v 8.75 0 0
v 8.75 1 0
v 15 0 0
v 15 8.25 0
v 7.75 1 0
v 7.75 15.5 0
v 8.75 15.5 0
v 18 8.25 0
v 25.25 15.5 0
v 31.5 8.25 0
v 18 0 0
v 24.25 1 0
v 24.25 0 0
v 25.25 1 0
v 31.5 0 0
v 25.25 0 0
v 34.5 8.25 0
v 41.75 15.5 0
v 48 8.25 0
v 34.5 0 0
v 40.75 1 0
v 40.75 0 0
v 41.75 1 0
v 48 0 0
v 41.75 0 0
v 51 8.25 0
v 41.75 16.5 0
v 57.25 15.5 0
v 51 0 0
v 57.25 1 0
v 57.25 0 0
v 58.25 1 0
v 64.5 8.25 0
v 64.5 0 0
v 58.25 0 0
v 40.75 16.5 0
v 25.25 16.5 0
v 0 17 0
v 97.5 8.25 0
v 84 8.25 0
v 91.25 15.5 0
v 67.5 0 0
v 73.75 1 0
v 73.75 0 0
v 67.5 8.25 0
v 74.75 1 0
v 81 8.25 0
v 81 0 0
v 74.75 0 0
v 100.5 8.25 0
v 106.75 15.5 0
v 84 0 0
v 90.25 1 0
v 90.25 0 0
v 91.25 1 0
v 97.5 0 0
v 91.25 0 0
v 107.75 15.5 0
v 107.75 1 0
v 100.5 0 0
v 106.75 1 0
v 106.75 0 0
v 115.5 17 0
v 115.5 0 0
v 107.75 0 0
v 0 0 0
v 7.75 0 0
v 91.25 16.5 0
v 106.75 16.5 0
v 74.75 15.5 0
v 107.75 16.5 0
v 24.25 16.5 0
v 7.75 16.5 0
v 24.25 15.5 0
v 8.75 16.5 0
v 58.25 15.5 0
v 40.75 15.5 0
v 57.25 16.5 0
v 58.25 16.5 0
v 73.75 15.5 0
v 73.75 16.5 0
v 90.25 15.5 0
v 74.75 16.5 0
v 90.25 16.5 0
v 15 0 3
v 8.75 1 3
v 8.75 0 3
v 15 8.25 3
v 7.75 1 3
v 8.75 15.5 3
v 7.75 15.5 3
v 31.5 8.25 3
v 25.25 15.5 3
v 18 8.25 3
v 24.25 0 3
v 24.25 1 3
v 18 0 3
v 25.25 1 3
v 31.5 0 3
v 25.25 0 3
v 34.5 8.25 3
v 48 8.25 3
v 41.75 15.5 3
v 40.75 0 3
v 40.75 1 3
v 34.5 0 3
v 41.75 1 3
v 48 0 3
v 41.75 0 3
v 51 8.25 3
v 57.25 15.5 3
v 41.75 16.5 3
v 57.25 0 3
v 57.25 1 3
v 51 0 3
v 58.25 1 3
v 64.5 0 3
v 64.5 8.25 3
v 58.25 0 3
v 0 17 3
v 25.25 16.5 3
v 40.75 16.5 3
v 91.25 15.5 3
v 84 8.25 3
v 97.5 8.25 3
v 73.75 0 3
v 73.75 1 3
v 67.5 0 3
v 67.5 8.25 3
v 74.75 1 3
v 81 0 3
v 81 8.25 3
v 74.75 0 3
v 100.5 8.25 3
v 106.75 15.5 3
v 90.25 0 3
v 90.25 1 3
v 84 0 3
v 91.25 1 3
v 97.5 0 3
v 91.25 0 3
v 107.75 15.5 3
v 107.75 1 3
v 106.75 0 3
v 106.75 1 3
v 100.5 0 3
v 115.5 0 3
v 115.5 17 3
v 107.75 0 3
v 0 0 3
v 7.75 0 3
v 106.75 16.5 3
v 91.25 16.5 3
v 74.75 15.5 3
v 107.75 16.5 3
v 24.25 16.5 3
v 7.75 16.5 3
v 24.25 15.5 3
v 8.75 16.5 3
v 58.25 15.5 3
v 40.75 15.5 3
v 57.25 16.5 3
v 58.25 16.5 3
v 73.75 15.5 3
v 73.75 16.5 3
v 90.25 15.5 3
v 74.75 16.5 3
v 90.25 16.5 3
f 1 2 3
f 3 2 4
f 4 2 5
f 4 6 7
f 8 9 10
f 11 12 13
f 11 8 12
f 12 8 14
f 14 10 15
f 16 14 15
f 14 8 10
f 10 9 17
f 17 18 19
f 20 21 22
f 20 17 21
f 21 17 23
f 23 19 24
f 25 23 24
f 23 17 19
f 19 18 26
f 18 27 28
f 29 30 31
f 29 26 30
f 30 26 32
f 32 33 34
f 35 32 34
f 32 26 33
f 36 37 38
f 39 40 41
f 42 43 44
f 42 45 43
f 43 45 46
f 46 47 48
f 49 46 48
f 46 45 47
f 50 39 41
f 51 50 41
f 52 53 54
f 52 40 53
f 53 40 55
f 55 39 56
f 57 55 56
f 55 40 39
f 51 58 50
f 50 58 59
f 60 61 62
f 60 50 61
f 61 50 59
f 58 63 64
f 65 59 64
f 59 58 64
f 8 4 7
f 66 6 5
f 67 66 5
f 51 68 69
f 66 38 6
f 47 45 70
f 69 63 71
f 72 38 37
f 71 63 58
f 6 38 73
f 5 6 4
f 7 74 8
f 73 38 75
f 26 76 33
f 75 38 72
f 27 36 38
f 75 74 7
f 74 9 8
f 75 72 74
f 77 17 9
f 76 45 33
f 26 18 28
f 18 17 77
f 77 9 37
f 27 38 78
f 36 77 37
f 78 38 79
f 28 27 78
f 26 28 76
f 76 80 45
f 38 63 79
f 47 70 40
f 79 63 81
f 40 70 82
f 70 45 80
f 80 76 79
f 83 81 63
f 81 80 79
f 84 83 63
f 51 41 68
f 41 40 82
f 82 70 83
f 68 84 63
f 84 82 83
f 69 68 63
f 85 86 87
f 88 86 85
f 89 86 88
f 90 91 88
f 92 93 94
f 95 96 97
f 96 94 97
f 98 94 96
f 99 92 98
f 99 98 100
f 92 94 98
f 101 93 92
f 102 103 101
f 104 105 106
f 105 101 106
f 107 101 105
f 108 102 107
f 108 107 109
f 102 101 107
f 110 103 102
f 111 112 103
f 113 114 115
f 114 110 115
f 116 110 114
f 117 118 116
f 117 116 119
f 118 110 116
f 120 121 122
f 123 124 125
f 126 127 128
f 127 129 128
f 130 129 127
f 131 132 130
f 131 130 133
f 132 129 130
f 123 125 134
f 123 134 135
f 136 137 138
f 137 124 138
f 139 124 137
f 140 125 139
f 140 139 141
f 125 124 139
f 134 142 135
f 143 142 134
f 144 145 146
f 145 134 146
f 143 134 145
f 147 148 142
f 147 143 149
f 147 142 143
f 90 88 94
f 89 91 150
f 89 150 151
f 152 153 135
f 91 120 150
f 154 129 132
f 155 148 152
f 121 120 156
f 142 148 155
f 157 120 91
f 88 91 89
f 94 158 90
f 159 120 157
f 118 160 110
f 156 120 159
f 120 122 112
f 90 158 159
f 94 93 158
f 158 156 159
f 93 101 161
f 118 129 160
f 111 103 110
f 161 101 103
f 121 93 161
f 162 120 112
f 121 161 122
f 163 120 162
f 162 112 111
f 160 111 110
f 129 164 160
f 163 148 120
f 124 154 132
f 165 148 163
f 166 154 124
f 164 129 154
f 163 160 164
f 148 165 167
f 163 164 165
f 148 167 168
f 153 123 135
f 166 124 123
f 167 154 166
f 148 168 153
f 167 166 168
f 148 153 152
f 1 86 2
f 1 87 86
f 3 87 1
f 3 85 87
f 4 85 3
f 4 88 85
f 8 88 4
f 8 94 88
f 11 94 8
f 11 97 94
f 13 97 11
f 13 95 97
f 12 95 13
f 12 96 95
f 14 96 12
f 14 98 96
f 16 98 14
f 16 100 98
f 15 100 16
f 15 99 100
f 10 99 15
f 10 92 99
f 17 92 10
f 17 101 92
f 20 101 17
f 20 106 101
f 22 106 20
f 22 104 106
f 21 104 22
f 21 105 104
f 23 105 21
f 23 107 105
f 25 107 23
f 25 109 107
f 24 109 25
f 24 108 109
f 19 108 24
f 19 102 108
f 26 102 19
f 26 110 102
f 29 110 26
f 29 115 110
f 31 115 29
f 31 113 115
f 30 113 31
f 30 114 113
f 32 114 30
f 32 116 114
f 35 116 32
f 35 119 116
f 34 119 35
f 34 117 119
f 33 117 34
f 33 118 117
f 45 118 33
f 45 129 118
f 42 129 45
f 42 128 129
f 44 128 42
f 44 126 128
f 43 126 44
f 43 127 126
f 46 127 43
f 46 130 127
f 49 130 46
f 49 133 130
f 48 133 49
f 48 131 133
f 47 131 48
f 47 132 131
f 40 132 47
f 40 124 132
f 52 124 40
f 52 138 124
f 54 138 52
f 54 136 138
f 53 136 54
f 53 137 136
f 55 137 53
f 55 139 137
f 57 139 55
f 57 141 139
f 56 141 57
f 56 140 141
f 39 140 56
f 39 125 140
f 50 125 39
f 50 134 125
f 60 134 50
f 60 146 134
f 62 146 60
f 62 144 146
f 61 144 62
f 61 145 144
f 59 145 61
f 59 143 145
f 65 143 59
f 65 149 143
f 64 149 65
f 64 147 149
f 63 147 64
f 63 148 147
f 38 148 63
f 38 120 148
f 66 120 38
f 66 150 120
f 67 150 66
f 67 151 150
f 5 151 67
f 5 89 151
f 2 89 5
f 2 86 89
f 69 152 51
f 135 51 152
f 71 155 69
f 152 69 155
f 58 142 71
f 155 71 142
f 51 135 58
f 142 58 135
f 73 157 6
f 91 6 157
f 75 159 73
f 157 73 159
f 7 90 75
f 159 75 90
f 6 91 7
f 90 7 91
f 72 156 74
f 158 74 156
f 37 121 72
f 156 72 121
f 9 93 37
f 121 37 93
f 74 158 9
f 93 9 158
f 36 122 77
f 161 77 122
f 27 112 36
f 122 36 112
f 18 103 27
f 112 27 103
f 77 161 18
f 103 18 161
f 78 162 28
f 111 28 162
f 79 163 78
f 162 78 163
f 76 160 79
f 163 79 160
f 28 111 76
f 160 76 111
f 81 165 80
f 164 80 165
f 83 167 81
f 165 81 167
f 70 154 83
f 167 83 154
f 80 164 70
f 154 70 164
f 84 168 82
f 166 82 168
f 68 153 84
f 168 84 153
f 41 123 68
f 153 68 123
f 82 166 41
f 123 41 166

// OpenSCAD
nbled = 7;
ecart = 16.5;
fil   = 0.5;
depth = 3;

linear_extrude(height = depth)
difference() {  
    square([nbled*ecart,ecart+fil]);

for (i = [1:nbled]) {
    translate([i*ecart - ecart/2 - fil,0,0]) 
    square([fil*2,fil*2]);
  }

for (i = [1:nbled]) {
    translate([i*ecart - ecart/2 - fil,ecart-fil*2,0]) 
    square([fil*2,fil*2]); 
  }

for (i = [1:nbled-1]) {
    translate([i*ecart-depth/2,0,0]) 
    square([depth,ecart/2]); 
  }  
 }
